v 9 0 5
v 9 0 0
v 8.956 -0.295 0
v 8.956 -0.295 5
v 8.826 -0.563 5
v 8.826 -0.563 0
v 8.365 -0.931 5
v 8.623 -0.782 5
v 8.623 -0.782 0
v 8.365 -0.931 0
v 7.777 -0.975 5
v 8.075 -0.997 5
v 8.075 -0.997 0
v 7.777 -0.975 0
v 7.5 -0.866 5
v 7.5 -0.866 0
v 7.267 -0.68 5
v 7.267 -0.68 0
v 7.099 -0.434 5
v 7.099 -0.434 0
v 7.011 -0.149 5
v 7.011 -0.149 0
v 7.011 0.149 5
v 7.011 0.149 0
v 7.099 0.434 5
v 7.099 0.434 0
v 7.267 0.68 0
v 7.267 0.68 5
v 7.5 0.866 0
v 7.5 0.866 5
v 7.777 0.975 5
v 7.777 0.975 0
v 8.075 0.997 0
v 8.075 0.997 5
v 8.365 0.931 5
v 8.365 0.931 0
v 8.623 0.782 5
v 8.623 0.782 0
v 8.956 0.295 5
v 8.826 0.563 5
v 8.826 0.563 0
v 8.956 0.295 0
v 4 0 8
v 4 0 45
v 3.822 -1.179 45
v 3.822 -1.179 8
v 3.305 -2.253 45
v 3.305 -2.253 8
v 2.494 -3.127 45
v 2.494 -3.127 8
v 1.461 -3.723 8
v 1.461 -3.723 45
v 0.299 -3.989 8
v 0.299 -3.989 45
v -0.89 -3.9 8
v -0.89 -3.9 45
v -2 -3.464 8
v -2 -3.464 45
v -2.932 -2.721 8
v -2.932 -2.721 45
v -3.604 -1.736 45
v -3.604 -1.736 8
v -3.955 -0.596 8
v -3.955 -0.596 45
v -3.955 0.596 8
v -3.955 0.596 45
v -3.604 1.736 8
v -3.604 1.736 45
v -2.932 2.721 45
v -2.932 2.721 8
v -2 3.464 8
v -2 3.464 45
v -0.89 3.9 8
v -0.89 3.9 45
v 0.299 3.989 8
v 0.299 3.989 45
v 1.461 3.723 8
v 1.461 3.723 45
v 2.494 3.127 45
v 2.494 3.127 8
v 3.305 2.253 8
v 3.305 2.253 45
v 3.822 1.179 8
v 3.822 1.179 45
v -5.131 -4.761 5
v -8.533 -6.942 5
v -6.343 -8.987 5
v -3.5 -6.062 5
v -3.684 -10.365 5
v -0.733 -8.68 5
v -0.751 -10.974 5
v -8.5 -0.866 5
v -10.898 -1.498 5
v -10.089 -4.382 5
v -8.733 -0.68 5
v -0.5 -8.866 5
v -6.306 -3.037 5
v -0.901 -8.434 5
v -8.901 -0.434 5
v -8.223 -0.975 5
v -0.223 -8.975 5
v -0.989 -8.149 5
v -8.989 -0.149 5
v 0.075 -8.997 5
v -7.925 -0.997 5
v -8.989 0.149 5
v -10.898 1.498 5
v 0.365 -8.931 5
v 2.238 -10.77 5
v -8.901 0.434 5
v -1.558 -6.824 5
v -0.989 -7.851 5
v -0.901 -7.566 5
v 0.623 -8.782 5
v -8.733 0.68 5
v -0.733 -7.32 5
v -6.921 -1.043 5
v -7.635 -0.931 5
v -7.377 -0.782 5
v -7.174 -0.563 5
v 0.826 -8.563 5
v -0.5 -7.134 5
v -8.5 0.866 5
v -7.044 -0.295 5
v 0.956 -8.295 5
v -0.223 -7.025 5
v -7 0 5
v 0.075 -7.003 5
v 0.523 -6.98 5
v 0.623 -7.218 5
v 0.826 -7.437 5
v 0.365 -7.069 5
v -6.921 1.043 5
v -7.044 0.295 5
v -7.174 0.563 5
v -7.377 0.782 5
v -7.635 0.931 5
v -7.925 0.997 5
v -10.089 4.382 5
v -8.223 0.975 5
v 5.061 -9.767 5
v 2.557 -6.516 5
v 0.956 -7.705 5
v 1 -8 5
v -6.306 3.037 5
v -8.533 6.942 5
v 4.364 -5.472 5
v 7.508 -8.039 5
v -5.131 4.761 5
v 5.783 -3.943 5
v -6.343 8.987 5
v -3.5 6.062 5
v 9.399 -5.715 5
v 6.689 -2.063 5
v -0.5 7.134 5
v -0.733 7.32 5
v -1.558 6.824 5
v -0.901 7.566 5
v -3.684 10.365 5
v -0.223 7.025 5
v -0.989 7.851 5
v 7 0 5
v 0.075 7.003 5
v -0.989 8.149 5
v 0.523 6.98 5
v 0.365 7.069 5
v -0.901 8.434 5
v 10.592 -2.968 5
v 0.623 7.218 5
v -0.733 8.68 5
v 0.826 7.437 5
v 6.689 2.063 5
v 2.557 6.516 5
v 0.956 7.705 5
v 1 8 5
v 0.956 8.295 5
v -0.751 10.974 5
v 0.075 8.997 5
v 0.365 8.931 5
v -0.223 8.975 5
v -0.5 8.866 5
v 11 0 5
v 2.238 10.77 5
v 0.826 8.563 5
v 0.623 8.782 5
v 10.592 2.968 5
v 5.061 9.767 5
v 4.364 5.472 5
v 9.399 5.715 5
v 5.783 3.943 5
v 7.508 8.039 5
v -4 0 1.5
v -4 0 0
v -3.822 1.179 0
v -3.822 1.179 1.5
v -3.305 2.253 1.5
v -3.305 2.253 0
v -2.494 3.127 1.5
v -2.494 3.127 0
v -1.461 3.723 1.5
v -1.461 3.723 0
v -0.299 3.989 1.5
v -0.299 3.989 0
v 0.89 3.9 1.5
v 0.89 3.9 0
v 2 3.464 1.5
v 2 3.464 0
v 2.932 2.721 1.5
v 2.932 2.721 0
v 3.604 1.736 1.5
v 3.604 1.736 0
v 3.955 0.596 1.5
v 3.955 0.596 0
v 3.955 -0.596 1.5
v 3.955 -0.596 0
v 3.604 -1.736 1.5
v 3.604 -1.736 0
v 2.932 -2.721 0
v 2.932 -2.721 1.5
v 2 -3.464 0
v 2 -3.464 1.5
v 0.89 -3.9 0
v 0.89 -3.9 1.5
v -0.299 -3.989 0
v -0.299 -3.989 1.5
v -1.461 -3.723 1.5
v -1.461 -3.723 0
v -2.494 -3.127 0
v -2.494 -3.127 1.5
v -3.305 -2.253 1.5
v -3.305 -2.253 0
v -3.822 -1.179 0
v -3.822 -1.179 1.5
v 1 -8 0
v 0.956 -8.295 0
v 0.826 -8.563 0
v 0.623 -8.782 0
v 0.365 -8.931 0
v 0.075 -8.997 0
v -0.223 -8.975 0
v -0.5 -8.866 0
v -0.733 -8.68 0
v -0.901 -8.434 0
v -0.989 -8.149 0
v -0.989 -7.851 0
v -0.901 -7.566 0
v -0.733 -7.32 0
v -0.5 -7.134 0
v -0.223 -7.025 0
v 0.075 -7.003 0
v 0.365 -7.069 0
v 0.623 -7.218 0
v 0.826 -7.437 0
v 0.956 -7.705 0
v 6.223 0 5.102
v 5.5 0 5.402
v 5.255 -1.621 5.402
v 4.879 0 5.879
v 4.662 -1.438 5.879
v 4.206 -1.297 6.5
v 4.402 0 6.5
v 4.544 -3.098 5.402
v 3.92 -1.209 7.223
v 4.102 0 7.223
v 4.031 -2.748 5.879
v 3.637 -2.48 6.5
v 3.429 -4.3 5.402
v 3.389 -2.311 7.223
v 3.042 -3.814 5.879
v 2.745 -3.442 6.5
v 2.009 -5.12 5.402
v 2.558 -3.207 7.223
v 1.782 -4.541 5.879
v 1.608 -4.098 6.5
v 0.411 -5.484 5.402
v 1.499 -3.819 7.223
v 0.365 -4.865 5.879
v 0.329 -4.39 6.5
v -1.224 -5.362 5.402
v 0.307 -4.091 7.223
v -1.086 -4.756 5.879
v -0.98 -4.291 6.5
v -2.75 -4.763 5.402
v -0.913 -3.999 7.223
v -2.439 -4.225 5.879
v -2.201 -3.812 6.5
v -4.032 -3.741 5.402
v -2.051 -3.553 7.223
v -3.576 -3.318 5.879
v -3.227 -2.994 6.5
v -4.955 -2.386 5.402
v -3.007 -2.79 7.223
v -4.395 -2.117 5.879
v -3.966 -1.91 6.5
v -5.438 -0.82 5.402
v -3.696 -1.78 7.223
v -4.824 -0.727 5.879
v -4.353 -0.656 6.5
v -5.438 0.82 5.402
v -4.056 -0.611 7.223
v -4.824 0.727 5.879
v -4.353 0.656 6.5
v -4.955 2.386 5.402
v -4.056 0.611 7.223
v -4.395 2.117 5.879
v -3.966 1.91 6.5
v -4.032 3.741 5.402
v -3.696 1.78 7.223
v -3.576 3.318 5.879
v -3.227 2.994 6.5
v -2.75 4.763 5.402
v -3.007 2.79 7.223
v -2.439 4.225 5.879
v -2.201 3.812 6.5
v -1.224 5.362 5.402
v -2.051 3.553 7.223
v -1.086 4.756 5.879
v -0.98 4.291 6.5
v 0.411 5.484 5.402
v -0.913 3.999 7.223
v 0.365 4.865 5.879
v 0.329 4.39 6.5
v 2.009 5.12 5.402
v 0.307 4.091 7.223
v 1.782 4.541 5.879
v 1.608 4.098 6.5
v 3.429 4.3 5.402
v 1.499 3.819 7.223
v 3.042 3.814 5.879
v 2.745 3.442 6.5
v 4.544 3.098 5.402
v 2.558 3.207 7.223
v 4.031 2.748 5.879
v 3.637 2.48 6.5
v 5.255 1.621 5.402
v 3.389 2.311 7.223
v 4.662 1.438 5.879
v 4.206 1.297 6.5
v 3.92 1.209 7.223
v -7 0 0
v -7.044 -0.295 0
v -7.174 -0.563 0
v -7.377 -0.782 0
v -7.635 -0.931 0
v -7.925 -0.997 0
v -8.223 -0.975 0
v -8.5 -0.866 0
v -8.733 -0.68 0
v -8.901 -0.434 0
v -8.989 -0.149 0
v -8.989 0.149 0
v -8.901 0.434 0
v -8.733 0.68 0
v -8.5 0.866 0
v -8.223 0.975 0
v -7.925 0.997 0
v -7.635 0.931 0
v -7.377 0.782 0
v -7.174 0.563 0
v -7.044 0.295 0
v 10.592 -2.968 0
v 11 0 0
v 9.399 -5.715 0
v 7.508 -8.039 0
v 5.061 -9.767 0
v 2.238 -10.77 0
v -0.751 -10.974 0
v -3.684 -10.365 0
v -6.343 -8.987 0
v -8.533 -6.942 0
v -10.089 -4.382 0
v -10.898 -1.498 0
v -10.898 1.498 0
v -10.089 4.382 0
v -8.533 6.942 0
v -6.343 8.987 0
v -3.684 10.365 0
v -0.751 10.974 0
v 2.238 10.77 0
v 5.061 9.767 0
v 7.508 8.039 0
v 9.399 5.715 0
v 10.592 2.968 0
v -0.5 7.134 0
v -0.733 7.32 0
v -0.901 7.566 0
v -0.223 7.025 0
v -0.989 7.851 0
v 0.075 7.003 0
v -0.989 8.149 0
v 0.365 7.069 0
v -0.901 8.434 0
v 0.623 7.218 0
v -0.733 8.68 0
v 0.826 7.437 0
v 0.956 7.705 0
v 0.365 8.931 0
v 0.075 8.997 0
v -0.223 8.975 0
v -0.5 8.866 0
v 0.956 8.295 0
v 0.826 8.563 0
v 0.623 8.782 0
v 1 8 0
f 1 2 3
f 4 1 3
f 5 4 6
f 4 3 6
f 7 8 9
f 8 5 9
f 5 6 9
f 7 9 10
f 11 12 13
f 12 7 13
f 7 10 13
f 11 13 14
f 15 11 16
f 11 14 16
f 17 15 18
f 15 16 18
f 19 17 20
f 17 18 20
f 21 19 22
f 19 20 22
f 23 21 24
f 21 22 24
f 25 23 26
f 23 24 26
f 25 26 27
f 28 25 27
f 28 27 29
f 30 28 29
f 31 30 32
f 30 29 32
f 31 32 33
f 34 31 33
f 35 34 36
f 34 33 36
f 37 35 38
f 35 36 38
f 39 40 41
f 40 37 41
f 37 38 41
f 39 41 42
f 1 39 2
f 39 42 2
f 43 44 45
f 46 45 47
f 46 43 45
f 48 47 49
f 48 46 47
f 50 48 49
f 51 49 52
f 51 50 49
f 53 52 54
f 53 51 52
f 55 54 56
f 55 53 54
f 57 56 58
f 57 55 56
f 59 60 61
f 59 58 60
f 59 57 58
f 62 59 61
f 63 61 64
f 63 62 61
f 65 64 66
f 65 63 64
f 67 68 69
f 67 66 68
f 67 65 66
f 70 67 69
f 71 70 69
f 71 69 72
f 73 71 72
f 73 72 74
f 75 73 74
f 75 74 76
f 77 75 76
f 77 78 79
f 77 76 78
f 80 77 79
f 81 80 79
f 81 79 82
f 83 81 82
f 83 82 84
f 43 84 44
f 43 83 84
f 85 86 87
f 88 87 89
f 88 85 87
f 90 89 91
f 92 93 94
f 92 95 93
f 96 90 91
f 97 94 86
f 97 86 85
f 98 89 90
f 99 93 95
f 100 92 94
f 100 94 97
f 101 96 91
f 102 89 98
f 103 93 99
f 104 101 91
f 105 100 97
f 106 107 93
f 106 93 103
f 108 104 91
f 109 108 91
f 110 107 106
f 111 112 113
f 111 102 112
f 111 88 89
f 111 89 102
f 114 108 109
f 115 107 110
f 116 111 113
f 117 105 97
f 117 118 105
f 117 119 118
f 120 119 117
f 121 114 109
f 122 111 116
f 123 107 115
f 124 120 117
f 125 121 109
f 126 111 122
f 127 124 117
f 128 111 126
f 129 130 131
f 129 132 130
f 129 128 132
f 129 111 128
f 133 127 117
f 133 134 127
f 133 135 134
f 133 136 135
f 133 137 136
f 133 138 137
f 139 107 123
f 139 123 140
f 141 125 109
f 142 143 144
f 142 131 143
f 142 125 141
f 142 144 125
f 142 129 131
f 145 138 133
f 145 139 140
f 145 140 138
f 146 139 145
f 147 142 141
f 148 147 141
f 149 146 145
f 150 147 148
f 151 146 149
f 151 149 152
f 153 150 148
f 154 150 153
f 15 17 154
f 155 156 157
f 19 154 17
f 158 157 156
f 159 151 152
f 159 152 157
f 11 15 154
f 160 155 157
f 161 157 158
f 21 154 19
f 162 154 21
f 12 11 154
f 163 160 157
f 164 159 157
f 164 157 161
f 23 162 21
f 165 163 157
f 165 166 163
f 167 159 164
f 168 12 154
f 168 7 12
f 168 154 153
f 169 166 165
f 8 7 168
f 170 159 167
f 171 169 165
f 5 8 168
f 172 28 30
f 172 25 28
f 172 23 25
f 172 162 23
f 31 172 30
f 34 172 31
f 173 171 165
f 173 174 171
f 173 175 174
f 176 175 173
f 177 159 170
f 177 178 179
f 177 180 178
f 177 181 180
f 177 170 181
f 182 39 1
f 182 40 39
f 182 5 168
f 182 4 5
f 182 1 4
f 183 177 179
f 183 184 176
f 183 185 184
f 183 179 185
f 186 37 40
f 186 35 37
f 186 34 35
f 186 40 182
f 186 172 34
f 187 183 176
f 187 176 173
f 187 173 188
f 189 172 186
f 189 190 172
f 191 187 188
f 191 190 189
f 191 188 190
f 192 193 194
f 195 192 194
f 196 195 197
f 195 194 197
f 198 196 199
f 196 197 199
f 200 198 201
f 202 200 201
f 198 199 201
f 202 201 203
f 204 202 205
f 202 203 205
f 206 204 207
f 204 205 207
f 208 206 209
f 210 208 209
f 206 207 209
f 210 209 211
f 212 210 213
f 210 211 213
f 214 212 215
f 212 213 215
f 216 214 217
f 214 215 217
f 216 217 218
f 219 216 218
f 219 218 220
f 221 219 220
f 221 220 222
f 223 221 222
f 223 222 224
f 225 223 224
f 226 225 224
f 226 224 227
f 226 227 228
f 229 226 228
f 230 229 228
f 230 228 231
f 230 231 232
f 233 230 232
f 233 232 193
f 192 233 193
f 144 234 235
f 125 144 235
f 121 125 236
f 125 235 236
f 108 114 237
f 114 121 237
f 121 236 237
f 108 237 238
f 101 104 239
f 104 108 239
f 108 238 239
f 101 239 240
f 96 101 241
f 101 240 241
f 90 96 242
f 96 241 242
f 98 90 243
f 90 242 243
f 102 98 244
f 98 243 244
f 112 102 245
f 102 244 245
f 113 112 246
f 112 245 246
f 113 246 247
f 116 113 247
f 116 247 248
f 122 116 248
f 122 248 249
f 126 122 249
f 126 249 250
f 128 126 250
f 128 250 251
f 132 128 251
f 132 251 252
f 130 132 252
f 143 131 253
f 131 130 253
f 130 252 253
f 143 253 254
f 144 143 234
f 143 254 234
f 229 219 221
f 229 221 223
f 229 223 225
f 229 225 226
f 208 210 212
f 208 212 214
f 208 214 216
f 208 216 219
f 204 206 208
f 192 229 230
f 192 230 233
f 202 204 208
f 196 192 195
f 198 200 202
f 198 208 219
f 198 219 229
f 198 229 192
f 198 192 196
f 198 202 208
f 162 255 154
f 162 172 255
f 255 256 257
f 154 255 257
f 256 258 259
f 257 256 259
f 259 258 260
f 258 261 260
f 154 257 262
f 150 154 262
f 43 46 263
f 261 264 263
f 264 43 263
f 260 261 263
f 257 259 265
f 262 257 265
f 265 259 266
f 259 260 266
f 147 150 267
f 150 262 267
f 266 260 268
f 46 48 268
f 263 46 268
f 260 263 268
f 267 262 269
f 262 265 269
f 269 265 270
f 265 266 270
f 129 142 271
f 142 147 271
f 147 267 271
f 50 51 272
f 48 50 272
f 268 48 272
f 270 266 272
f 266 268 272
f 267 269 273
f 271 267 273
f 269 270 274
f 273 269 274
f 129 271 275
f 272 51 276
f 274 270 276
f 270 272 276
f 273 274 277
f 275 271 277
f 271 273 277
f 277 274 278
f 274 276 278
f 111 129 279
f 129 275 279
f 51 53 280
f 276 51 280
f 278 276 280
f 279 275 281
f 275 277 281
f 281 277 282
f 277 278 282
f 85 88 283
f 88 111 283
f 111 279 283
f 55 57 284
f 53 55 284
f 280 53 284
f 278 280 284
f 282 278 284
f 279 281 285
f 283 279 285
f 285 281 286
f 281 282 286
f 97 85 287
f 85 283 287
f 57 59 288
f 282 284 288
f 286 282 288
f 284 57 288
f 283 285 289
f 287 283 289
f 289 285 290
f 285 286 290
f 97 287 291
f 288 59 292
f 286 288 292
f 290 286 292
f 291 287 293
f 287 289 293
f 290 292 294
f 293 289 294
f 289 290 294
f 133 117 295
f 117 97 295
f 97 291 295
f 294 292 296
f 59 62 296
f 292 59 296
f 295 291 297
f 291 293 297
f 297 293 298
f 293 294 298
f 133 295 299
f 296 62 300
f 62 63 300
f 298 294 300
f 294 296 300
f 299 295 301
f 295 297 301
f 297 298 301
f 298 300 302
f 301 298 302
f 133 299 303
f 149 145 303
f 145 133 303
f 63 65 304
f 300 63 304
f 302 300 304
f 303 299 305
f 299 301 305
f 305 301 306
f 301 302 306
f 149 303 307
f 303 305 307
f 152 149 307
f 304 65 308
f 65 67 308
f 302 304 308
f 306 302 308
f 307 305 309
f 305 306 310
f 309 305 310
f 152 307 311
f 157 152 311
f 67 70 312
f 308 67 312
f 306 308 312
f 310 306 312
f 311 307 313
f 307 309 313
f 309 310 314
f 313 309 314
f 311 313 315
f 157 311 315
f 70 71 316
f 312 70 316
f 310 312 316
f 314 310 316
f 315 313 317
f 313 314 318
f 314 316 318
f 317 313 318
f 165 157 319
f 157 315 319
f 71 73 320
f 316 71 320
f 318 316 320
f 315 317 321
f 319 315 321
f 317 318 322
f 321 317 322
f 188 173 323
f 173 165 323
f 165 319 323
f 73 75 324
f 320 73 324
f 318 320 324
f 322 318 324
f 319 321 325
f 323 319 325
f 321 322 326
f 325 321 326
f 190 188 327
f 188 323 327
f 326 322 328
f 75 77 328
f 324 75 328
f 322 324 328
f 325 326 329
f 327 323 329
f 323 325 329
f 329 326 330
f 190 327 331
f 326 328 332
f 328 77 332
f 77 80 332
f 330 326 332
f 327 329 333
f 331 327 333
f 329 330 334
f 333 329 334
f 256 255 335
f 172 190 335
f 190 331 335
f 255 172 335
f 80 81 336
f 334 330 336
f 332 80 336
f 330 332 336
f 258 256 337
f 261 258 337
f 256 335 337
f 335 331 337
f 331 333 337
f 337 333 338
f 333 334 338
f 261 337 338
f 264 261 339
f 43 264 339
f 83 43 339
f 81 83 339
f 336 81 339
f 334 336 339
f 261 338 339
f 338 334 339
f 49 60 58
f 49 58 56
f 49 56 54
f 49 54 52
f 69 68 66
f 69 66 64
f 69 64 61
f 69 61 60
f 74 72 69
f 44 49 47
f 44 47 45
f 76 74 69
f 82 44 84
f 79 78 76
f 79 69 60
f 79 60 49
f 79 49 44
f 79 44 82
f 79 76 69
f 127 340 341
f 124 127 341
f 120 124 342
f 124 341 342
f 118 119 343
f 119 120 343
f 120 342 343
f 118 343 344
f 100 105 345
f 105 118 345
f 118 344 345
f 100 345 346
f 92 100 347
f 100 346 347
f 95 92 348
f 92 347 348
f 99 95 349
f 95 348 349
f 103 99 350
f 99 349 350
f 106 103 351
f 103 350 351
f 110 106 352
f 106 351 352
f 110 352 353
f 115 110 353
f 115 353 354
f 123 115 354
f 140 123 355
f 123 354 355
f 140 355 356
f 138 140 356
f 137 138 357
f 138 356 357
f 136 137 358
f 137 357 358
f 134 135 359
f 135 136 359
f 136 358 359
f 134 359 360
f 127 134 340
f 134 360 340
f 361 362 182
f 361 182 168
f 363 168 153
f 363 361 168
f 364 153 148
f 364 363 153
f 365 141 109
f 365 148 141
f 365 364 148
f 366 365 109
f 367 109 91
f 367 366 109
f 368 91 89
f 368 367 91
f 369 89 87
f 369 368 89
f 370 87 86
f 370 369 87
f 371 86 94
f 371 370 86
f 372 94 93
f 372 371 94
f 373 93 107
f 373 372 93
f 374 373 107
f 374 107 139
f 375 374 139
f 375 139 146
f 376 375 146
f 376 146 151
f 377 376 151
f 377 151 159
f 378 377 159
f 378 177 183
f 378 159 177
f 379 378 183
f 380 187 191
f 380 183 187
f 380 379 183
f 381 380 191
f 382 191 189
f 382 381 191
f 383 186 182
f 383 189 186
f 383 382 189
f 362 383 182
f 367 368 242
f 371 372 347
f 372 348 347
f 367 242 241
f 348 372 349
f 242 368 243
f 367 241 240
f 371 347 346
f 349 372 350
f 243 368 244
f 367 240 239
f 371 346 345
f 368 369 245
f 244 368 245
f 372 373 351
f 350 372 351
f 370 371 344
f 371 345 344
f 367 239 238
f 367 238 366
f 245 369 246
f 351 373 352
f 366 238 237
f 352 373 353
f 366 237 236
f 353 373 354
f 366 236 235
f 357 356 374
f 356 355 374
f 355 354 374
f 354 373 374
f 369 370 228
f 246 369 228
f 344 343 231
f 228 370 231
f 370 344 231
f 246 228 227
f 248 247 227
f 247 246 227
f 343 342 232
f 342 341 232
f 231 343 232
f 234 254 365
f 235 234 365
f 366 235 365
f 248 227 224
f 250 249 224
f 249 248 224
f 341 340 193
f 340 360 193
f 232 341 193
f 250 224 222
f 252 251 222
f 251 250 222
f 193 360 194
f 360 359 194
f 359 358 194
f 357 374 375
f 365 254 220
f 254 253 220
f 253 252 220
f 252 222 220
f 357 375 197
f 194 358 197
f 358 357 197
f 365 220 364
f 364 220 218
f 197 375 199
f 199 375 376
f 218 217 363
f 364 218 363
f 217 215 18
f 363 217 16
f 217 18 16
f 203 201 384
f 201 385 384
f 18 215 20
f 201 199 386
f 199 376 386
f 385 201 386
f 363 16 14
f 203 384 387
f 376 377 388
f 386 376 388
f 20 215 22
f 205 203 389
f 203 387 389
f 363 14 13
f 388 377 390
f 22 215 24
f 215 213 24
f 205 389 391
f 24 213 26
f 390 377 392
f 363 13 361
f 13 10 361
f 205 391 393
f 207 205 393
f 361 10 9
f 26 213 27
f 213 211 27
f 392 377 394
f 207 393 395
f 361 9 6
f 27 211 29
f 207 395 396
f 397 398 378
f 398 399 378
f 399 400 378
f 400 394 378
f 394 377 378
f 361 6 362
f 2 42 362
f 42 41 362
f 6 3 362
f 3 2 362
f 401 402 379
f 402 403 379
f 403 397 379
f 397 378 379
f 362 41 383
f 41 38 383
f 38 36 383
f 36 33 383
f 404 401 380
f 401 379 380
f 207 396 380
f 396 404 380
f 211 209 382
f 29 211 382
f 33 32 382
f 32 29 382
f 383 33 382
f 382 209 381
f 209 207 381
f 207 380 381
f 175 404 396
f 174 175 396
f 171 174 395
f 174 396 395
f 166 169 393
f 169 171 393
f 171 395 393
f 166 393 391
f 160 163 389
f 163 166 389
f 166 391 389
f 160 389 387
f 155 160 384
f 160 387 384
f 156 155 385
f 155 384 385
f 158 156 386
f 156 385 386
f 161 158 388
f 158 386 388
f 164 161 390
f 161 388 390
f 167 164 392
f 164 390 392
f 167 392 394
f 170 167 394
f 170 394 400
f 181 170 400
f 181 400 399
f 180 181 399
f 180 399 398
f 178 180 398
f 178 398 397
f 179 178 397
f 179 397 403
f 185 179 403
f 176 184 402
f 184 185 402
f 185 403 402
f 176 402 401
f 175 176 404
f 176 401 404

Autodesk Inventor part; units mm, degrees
ref_plane "YZ Plane" through (0, 0, 0) normal (1, 0, 0) x (0, 1, 0)
ref_plane "XZ Plane" through (0, 0, 0) normal (0, 1, 0) x (-1, 0, 0)
ref_plane "XY Plane" through (0, 0, 0) normal (0, 0, 1) x (1, 0, 0)
sketch "Esquisse1" plane through (0, 0, 0) normal (0, 0, 1) x (1, 0, 0)
  circle A0 centre (0, 0) radius 11
  circle A1 centre (0, 0) radius 8 construction
  line L0 (0, 0) -> (8, 0) construction
  circle A2 centre (8, 0) radius 1
  line L1 (0, 0) -> (0, 8) construction
  circle A3 centre (0, 8) radius 1
  line L2 (0, 0) -> (-8, 0) construction
  circle A4 centre (-8, 0) radius 1
  line L3 (0, 0) -> (0, -8) construction
  circle A5 centre (0, -8) radius 1
  dimension "d1" = 16
  dimension "d0" = 22
  dimension "d3" = 2
  dimension "d6" = 360
extrude "Extrusion1" add sketch "Esquisse1" along normal blind 5
sketch "Esquisse2" plane through (0, 0, 5) normal (0, 0, 1) x (1, 0, 0)
  circle A0 centre (0, 0) radius 11 projected
  circle A1 centre (0, 0) radius 4
  dimension "d10" = 8
extrude "Extrusion2" add sketch "Esquisse2" along normal blind 40 contours A1
sketch "Esquisse3" plane through (0, 0, 0) normal (0, 0, -1) x (-1, 0, 0)
  circle A0 centre (0, 0) radius 11 projected
  circle A1 centre (0, 0) radius 4
  dimension "d14" = 8
extrude "Extrusion3" cut sketch "Esquisse3" against normal blind 1.5 contours A1
fillet "Congé1" radius 3 1 edges at (-4, 0, 5)
properties part number "ax12tobase"
